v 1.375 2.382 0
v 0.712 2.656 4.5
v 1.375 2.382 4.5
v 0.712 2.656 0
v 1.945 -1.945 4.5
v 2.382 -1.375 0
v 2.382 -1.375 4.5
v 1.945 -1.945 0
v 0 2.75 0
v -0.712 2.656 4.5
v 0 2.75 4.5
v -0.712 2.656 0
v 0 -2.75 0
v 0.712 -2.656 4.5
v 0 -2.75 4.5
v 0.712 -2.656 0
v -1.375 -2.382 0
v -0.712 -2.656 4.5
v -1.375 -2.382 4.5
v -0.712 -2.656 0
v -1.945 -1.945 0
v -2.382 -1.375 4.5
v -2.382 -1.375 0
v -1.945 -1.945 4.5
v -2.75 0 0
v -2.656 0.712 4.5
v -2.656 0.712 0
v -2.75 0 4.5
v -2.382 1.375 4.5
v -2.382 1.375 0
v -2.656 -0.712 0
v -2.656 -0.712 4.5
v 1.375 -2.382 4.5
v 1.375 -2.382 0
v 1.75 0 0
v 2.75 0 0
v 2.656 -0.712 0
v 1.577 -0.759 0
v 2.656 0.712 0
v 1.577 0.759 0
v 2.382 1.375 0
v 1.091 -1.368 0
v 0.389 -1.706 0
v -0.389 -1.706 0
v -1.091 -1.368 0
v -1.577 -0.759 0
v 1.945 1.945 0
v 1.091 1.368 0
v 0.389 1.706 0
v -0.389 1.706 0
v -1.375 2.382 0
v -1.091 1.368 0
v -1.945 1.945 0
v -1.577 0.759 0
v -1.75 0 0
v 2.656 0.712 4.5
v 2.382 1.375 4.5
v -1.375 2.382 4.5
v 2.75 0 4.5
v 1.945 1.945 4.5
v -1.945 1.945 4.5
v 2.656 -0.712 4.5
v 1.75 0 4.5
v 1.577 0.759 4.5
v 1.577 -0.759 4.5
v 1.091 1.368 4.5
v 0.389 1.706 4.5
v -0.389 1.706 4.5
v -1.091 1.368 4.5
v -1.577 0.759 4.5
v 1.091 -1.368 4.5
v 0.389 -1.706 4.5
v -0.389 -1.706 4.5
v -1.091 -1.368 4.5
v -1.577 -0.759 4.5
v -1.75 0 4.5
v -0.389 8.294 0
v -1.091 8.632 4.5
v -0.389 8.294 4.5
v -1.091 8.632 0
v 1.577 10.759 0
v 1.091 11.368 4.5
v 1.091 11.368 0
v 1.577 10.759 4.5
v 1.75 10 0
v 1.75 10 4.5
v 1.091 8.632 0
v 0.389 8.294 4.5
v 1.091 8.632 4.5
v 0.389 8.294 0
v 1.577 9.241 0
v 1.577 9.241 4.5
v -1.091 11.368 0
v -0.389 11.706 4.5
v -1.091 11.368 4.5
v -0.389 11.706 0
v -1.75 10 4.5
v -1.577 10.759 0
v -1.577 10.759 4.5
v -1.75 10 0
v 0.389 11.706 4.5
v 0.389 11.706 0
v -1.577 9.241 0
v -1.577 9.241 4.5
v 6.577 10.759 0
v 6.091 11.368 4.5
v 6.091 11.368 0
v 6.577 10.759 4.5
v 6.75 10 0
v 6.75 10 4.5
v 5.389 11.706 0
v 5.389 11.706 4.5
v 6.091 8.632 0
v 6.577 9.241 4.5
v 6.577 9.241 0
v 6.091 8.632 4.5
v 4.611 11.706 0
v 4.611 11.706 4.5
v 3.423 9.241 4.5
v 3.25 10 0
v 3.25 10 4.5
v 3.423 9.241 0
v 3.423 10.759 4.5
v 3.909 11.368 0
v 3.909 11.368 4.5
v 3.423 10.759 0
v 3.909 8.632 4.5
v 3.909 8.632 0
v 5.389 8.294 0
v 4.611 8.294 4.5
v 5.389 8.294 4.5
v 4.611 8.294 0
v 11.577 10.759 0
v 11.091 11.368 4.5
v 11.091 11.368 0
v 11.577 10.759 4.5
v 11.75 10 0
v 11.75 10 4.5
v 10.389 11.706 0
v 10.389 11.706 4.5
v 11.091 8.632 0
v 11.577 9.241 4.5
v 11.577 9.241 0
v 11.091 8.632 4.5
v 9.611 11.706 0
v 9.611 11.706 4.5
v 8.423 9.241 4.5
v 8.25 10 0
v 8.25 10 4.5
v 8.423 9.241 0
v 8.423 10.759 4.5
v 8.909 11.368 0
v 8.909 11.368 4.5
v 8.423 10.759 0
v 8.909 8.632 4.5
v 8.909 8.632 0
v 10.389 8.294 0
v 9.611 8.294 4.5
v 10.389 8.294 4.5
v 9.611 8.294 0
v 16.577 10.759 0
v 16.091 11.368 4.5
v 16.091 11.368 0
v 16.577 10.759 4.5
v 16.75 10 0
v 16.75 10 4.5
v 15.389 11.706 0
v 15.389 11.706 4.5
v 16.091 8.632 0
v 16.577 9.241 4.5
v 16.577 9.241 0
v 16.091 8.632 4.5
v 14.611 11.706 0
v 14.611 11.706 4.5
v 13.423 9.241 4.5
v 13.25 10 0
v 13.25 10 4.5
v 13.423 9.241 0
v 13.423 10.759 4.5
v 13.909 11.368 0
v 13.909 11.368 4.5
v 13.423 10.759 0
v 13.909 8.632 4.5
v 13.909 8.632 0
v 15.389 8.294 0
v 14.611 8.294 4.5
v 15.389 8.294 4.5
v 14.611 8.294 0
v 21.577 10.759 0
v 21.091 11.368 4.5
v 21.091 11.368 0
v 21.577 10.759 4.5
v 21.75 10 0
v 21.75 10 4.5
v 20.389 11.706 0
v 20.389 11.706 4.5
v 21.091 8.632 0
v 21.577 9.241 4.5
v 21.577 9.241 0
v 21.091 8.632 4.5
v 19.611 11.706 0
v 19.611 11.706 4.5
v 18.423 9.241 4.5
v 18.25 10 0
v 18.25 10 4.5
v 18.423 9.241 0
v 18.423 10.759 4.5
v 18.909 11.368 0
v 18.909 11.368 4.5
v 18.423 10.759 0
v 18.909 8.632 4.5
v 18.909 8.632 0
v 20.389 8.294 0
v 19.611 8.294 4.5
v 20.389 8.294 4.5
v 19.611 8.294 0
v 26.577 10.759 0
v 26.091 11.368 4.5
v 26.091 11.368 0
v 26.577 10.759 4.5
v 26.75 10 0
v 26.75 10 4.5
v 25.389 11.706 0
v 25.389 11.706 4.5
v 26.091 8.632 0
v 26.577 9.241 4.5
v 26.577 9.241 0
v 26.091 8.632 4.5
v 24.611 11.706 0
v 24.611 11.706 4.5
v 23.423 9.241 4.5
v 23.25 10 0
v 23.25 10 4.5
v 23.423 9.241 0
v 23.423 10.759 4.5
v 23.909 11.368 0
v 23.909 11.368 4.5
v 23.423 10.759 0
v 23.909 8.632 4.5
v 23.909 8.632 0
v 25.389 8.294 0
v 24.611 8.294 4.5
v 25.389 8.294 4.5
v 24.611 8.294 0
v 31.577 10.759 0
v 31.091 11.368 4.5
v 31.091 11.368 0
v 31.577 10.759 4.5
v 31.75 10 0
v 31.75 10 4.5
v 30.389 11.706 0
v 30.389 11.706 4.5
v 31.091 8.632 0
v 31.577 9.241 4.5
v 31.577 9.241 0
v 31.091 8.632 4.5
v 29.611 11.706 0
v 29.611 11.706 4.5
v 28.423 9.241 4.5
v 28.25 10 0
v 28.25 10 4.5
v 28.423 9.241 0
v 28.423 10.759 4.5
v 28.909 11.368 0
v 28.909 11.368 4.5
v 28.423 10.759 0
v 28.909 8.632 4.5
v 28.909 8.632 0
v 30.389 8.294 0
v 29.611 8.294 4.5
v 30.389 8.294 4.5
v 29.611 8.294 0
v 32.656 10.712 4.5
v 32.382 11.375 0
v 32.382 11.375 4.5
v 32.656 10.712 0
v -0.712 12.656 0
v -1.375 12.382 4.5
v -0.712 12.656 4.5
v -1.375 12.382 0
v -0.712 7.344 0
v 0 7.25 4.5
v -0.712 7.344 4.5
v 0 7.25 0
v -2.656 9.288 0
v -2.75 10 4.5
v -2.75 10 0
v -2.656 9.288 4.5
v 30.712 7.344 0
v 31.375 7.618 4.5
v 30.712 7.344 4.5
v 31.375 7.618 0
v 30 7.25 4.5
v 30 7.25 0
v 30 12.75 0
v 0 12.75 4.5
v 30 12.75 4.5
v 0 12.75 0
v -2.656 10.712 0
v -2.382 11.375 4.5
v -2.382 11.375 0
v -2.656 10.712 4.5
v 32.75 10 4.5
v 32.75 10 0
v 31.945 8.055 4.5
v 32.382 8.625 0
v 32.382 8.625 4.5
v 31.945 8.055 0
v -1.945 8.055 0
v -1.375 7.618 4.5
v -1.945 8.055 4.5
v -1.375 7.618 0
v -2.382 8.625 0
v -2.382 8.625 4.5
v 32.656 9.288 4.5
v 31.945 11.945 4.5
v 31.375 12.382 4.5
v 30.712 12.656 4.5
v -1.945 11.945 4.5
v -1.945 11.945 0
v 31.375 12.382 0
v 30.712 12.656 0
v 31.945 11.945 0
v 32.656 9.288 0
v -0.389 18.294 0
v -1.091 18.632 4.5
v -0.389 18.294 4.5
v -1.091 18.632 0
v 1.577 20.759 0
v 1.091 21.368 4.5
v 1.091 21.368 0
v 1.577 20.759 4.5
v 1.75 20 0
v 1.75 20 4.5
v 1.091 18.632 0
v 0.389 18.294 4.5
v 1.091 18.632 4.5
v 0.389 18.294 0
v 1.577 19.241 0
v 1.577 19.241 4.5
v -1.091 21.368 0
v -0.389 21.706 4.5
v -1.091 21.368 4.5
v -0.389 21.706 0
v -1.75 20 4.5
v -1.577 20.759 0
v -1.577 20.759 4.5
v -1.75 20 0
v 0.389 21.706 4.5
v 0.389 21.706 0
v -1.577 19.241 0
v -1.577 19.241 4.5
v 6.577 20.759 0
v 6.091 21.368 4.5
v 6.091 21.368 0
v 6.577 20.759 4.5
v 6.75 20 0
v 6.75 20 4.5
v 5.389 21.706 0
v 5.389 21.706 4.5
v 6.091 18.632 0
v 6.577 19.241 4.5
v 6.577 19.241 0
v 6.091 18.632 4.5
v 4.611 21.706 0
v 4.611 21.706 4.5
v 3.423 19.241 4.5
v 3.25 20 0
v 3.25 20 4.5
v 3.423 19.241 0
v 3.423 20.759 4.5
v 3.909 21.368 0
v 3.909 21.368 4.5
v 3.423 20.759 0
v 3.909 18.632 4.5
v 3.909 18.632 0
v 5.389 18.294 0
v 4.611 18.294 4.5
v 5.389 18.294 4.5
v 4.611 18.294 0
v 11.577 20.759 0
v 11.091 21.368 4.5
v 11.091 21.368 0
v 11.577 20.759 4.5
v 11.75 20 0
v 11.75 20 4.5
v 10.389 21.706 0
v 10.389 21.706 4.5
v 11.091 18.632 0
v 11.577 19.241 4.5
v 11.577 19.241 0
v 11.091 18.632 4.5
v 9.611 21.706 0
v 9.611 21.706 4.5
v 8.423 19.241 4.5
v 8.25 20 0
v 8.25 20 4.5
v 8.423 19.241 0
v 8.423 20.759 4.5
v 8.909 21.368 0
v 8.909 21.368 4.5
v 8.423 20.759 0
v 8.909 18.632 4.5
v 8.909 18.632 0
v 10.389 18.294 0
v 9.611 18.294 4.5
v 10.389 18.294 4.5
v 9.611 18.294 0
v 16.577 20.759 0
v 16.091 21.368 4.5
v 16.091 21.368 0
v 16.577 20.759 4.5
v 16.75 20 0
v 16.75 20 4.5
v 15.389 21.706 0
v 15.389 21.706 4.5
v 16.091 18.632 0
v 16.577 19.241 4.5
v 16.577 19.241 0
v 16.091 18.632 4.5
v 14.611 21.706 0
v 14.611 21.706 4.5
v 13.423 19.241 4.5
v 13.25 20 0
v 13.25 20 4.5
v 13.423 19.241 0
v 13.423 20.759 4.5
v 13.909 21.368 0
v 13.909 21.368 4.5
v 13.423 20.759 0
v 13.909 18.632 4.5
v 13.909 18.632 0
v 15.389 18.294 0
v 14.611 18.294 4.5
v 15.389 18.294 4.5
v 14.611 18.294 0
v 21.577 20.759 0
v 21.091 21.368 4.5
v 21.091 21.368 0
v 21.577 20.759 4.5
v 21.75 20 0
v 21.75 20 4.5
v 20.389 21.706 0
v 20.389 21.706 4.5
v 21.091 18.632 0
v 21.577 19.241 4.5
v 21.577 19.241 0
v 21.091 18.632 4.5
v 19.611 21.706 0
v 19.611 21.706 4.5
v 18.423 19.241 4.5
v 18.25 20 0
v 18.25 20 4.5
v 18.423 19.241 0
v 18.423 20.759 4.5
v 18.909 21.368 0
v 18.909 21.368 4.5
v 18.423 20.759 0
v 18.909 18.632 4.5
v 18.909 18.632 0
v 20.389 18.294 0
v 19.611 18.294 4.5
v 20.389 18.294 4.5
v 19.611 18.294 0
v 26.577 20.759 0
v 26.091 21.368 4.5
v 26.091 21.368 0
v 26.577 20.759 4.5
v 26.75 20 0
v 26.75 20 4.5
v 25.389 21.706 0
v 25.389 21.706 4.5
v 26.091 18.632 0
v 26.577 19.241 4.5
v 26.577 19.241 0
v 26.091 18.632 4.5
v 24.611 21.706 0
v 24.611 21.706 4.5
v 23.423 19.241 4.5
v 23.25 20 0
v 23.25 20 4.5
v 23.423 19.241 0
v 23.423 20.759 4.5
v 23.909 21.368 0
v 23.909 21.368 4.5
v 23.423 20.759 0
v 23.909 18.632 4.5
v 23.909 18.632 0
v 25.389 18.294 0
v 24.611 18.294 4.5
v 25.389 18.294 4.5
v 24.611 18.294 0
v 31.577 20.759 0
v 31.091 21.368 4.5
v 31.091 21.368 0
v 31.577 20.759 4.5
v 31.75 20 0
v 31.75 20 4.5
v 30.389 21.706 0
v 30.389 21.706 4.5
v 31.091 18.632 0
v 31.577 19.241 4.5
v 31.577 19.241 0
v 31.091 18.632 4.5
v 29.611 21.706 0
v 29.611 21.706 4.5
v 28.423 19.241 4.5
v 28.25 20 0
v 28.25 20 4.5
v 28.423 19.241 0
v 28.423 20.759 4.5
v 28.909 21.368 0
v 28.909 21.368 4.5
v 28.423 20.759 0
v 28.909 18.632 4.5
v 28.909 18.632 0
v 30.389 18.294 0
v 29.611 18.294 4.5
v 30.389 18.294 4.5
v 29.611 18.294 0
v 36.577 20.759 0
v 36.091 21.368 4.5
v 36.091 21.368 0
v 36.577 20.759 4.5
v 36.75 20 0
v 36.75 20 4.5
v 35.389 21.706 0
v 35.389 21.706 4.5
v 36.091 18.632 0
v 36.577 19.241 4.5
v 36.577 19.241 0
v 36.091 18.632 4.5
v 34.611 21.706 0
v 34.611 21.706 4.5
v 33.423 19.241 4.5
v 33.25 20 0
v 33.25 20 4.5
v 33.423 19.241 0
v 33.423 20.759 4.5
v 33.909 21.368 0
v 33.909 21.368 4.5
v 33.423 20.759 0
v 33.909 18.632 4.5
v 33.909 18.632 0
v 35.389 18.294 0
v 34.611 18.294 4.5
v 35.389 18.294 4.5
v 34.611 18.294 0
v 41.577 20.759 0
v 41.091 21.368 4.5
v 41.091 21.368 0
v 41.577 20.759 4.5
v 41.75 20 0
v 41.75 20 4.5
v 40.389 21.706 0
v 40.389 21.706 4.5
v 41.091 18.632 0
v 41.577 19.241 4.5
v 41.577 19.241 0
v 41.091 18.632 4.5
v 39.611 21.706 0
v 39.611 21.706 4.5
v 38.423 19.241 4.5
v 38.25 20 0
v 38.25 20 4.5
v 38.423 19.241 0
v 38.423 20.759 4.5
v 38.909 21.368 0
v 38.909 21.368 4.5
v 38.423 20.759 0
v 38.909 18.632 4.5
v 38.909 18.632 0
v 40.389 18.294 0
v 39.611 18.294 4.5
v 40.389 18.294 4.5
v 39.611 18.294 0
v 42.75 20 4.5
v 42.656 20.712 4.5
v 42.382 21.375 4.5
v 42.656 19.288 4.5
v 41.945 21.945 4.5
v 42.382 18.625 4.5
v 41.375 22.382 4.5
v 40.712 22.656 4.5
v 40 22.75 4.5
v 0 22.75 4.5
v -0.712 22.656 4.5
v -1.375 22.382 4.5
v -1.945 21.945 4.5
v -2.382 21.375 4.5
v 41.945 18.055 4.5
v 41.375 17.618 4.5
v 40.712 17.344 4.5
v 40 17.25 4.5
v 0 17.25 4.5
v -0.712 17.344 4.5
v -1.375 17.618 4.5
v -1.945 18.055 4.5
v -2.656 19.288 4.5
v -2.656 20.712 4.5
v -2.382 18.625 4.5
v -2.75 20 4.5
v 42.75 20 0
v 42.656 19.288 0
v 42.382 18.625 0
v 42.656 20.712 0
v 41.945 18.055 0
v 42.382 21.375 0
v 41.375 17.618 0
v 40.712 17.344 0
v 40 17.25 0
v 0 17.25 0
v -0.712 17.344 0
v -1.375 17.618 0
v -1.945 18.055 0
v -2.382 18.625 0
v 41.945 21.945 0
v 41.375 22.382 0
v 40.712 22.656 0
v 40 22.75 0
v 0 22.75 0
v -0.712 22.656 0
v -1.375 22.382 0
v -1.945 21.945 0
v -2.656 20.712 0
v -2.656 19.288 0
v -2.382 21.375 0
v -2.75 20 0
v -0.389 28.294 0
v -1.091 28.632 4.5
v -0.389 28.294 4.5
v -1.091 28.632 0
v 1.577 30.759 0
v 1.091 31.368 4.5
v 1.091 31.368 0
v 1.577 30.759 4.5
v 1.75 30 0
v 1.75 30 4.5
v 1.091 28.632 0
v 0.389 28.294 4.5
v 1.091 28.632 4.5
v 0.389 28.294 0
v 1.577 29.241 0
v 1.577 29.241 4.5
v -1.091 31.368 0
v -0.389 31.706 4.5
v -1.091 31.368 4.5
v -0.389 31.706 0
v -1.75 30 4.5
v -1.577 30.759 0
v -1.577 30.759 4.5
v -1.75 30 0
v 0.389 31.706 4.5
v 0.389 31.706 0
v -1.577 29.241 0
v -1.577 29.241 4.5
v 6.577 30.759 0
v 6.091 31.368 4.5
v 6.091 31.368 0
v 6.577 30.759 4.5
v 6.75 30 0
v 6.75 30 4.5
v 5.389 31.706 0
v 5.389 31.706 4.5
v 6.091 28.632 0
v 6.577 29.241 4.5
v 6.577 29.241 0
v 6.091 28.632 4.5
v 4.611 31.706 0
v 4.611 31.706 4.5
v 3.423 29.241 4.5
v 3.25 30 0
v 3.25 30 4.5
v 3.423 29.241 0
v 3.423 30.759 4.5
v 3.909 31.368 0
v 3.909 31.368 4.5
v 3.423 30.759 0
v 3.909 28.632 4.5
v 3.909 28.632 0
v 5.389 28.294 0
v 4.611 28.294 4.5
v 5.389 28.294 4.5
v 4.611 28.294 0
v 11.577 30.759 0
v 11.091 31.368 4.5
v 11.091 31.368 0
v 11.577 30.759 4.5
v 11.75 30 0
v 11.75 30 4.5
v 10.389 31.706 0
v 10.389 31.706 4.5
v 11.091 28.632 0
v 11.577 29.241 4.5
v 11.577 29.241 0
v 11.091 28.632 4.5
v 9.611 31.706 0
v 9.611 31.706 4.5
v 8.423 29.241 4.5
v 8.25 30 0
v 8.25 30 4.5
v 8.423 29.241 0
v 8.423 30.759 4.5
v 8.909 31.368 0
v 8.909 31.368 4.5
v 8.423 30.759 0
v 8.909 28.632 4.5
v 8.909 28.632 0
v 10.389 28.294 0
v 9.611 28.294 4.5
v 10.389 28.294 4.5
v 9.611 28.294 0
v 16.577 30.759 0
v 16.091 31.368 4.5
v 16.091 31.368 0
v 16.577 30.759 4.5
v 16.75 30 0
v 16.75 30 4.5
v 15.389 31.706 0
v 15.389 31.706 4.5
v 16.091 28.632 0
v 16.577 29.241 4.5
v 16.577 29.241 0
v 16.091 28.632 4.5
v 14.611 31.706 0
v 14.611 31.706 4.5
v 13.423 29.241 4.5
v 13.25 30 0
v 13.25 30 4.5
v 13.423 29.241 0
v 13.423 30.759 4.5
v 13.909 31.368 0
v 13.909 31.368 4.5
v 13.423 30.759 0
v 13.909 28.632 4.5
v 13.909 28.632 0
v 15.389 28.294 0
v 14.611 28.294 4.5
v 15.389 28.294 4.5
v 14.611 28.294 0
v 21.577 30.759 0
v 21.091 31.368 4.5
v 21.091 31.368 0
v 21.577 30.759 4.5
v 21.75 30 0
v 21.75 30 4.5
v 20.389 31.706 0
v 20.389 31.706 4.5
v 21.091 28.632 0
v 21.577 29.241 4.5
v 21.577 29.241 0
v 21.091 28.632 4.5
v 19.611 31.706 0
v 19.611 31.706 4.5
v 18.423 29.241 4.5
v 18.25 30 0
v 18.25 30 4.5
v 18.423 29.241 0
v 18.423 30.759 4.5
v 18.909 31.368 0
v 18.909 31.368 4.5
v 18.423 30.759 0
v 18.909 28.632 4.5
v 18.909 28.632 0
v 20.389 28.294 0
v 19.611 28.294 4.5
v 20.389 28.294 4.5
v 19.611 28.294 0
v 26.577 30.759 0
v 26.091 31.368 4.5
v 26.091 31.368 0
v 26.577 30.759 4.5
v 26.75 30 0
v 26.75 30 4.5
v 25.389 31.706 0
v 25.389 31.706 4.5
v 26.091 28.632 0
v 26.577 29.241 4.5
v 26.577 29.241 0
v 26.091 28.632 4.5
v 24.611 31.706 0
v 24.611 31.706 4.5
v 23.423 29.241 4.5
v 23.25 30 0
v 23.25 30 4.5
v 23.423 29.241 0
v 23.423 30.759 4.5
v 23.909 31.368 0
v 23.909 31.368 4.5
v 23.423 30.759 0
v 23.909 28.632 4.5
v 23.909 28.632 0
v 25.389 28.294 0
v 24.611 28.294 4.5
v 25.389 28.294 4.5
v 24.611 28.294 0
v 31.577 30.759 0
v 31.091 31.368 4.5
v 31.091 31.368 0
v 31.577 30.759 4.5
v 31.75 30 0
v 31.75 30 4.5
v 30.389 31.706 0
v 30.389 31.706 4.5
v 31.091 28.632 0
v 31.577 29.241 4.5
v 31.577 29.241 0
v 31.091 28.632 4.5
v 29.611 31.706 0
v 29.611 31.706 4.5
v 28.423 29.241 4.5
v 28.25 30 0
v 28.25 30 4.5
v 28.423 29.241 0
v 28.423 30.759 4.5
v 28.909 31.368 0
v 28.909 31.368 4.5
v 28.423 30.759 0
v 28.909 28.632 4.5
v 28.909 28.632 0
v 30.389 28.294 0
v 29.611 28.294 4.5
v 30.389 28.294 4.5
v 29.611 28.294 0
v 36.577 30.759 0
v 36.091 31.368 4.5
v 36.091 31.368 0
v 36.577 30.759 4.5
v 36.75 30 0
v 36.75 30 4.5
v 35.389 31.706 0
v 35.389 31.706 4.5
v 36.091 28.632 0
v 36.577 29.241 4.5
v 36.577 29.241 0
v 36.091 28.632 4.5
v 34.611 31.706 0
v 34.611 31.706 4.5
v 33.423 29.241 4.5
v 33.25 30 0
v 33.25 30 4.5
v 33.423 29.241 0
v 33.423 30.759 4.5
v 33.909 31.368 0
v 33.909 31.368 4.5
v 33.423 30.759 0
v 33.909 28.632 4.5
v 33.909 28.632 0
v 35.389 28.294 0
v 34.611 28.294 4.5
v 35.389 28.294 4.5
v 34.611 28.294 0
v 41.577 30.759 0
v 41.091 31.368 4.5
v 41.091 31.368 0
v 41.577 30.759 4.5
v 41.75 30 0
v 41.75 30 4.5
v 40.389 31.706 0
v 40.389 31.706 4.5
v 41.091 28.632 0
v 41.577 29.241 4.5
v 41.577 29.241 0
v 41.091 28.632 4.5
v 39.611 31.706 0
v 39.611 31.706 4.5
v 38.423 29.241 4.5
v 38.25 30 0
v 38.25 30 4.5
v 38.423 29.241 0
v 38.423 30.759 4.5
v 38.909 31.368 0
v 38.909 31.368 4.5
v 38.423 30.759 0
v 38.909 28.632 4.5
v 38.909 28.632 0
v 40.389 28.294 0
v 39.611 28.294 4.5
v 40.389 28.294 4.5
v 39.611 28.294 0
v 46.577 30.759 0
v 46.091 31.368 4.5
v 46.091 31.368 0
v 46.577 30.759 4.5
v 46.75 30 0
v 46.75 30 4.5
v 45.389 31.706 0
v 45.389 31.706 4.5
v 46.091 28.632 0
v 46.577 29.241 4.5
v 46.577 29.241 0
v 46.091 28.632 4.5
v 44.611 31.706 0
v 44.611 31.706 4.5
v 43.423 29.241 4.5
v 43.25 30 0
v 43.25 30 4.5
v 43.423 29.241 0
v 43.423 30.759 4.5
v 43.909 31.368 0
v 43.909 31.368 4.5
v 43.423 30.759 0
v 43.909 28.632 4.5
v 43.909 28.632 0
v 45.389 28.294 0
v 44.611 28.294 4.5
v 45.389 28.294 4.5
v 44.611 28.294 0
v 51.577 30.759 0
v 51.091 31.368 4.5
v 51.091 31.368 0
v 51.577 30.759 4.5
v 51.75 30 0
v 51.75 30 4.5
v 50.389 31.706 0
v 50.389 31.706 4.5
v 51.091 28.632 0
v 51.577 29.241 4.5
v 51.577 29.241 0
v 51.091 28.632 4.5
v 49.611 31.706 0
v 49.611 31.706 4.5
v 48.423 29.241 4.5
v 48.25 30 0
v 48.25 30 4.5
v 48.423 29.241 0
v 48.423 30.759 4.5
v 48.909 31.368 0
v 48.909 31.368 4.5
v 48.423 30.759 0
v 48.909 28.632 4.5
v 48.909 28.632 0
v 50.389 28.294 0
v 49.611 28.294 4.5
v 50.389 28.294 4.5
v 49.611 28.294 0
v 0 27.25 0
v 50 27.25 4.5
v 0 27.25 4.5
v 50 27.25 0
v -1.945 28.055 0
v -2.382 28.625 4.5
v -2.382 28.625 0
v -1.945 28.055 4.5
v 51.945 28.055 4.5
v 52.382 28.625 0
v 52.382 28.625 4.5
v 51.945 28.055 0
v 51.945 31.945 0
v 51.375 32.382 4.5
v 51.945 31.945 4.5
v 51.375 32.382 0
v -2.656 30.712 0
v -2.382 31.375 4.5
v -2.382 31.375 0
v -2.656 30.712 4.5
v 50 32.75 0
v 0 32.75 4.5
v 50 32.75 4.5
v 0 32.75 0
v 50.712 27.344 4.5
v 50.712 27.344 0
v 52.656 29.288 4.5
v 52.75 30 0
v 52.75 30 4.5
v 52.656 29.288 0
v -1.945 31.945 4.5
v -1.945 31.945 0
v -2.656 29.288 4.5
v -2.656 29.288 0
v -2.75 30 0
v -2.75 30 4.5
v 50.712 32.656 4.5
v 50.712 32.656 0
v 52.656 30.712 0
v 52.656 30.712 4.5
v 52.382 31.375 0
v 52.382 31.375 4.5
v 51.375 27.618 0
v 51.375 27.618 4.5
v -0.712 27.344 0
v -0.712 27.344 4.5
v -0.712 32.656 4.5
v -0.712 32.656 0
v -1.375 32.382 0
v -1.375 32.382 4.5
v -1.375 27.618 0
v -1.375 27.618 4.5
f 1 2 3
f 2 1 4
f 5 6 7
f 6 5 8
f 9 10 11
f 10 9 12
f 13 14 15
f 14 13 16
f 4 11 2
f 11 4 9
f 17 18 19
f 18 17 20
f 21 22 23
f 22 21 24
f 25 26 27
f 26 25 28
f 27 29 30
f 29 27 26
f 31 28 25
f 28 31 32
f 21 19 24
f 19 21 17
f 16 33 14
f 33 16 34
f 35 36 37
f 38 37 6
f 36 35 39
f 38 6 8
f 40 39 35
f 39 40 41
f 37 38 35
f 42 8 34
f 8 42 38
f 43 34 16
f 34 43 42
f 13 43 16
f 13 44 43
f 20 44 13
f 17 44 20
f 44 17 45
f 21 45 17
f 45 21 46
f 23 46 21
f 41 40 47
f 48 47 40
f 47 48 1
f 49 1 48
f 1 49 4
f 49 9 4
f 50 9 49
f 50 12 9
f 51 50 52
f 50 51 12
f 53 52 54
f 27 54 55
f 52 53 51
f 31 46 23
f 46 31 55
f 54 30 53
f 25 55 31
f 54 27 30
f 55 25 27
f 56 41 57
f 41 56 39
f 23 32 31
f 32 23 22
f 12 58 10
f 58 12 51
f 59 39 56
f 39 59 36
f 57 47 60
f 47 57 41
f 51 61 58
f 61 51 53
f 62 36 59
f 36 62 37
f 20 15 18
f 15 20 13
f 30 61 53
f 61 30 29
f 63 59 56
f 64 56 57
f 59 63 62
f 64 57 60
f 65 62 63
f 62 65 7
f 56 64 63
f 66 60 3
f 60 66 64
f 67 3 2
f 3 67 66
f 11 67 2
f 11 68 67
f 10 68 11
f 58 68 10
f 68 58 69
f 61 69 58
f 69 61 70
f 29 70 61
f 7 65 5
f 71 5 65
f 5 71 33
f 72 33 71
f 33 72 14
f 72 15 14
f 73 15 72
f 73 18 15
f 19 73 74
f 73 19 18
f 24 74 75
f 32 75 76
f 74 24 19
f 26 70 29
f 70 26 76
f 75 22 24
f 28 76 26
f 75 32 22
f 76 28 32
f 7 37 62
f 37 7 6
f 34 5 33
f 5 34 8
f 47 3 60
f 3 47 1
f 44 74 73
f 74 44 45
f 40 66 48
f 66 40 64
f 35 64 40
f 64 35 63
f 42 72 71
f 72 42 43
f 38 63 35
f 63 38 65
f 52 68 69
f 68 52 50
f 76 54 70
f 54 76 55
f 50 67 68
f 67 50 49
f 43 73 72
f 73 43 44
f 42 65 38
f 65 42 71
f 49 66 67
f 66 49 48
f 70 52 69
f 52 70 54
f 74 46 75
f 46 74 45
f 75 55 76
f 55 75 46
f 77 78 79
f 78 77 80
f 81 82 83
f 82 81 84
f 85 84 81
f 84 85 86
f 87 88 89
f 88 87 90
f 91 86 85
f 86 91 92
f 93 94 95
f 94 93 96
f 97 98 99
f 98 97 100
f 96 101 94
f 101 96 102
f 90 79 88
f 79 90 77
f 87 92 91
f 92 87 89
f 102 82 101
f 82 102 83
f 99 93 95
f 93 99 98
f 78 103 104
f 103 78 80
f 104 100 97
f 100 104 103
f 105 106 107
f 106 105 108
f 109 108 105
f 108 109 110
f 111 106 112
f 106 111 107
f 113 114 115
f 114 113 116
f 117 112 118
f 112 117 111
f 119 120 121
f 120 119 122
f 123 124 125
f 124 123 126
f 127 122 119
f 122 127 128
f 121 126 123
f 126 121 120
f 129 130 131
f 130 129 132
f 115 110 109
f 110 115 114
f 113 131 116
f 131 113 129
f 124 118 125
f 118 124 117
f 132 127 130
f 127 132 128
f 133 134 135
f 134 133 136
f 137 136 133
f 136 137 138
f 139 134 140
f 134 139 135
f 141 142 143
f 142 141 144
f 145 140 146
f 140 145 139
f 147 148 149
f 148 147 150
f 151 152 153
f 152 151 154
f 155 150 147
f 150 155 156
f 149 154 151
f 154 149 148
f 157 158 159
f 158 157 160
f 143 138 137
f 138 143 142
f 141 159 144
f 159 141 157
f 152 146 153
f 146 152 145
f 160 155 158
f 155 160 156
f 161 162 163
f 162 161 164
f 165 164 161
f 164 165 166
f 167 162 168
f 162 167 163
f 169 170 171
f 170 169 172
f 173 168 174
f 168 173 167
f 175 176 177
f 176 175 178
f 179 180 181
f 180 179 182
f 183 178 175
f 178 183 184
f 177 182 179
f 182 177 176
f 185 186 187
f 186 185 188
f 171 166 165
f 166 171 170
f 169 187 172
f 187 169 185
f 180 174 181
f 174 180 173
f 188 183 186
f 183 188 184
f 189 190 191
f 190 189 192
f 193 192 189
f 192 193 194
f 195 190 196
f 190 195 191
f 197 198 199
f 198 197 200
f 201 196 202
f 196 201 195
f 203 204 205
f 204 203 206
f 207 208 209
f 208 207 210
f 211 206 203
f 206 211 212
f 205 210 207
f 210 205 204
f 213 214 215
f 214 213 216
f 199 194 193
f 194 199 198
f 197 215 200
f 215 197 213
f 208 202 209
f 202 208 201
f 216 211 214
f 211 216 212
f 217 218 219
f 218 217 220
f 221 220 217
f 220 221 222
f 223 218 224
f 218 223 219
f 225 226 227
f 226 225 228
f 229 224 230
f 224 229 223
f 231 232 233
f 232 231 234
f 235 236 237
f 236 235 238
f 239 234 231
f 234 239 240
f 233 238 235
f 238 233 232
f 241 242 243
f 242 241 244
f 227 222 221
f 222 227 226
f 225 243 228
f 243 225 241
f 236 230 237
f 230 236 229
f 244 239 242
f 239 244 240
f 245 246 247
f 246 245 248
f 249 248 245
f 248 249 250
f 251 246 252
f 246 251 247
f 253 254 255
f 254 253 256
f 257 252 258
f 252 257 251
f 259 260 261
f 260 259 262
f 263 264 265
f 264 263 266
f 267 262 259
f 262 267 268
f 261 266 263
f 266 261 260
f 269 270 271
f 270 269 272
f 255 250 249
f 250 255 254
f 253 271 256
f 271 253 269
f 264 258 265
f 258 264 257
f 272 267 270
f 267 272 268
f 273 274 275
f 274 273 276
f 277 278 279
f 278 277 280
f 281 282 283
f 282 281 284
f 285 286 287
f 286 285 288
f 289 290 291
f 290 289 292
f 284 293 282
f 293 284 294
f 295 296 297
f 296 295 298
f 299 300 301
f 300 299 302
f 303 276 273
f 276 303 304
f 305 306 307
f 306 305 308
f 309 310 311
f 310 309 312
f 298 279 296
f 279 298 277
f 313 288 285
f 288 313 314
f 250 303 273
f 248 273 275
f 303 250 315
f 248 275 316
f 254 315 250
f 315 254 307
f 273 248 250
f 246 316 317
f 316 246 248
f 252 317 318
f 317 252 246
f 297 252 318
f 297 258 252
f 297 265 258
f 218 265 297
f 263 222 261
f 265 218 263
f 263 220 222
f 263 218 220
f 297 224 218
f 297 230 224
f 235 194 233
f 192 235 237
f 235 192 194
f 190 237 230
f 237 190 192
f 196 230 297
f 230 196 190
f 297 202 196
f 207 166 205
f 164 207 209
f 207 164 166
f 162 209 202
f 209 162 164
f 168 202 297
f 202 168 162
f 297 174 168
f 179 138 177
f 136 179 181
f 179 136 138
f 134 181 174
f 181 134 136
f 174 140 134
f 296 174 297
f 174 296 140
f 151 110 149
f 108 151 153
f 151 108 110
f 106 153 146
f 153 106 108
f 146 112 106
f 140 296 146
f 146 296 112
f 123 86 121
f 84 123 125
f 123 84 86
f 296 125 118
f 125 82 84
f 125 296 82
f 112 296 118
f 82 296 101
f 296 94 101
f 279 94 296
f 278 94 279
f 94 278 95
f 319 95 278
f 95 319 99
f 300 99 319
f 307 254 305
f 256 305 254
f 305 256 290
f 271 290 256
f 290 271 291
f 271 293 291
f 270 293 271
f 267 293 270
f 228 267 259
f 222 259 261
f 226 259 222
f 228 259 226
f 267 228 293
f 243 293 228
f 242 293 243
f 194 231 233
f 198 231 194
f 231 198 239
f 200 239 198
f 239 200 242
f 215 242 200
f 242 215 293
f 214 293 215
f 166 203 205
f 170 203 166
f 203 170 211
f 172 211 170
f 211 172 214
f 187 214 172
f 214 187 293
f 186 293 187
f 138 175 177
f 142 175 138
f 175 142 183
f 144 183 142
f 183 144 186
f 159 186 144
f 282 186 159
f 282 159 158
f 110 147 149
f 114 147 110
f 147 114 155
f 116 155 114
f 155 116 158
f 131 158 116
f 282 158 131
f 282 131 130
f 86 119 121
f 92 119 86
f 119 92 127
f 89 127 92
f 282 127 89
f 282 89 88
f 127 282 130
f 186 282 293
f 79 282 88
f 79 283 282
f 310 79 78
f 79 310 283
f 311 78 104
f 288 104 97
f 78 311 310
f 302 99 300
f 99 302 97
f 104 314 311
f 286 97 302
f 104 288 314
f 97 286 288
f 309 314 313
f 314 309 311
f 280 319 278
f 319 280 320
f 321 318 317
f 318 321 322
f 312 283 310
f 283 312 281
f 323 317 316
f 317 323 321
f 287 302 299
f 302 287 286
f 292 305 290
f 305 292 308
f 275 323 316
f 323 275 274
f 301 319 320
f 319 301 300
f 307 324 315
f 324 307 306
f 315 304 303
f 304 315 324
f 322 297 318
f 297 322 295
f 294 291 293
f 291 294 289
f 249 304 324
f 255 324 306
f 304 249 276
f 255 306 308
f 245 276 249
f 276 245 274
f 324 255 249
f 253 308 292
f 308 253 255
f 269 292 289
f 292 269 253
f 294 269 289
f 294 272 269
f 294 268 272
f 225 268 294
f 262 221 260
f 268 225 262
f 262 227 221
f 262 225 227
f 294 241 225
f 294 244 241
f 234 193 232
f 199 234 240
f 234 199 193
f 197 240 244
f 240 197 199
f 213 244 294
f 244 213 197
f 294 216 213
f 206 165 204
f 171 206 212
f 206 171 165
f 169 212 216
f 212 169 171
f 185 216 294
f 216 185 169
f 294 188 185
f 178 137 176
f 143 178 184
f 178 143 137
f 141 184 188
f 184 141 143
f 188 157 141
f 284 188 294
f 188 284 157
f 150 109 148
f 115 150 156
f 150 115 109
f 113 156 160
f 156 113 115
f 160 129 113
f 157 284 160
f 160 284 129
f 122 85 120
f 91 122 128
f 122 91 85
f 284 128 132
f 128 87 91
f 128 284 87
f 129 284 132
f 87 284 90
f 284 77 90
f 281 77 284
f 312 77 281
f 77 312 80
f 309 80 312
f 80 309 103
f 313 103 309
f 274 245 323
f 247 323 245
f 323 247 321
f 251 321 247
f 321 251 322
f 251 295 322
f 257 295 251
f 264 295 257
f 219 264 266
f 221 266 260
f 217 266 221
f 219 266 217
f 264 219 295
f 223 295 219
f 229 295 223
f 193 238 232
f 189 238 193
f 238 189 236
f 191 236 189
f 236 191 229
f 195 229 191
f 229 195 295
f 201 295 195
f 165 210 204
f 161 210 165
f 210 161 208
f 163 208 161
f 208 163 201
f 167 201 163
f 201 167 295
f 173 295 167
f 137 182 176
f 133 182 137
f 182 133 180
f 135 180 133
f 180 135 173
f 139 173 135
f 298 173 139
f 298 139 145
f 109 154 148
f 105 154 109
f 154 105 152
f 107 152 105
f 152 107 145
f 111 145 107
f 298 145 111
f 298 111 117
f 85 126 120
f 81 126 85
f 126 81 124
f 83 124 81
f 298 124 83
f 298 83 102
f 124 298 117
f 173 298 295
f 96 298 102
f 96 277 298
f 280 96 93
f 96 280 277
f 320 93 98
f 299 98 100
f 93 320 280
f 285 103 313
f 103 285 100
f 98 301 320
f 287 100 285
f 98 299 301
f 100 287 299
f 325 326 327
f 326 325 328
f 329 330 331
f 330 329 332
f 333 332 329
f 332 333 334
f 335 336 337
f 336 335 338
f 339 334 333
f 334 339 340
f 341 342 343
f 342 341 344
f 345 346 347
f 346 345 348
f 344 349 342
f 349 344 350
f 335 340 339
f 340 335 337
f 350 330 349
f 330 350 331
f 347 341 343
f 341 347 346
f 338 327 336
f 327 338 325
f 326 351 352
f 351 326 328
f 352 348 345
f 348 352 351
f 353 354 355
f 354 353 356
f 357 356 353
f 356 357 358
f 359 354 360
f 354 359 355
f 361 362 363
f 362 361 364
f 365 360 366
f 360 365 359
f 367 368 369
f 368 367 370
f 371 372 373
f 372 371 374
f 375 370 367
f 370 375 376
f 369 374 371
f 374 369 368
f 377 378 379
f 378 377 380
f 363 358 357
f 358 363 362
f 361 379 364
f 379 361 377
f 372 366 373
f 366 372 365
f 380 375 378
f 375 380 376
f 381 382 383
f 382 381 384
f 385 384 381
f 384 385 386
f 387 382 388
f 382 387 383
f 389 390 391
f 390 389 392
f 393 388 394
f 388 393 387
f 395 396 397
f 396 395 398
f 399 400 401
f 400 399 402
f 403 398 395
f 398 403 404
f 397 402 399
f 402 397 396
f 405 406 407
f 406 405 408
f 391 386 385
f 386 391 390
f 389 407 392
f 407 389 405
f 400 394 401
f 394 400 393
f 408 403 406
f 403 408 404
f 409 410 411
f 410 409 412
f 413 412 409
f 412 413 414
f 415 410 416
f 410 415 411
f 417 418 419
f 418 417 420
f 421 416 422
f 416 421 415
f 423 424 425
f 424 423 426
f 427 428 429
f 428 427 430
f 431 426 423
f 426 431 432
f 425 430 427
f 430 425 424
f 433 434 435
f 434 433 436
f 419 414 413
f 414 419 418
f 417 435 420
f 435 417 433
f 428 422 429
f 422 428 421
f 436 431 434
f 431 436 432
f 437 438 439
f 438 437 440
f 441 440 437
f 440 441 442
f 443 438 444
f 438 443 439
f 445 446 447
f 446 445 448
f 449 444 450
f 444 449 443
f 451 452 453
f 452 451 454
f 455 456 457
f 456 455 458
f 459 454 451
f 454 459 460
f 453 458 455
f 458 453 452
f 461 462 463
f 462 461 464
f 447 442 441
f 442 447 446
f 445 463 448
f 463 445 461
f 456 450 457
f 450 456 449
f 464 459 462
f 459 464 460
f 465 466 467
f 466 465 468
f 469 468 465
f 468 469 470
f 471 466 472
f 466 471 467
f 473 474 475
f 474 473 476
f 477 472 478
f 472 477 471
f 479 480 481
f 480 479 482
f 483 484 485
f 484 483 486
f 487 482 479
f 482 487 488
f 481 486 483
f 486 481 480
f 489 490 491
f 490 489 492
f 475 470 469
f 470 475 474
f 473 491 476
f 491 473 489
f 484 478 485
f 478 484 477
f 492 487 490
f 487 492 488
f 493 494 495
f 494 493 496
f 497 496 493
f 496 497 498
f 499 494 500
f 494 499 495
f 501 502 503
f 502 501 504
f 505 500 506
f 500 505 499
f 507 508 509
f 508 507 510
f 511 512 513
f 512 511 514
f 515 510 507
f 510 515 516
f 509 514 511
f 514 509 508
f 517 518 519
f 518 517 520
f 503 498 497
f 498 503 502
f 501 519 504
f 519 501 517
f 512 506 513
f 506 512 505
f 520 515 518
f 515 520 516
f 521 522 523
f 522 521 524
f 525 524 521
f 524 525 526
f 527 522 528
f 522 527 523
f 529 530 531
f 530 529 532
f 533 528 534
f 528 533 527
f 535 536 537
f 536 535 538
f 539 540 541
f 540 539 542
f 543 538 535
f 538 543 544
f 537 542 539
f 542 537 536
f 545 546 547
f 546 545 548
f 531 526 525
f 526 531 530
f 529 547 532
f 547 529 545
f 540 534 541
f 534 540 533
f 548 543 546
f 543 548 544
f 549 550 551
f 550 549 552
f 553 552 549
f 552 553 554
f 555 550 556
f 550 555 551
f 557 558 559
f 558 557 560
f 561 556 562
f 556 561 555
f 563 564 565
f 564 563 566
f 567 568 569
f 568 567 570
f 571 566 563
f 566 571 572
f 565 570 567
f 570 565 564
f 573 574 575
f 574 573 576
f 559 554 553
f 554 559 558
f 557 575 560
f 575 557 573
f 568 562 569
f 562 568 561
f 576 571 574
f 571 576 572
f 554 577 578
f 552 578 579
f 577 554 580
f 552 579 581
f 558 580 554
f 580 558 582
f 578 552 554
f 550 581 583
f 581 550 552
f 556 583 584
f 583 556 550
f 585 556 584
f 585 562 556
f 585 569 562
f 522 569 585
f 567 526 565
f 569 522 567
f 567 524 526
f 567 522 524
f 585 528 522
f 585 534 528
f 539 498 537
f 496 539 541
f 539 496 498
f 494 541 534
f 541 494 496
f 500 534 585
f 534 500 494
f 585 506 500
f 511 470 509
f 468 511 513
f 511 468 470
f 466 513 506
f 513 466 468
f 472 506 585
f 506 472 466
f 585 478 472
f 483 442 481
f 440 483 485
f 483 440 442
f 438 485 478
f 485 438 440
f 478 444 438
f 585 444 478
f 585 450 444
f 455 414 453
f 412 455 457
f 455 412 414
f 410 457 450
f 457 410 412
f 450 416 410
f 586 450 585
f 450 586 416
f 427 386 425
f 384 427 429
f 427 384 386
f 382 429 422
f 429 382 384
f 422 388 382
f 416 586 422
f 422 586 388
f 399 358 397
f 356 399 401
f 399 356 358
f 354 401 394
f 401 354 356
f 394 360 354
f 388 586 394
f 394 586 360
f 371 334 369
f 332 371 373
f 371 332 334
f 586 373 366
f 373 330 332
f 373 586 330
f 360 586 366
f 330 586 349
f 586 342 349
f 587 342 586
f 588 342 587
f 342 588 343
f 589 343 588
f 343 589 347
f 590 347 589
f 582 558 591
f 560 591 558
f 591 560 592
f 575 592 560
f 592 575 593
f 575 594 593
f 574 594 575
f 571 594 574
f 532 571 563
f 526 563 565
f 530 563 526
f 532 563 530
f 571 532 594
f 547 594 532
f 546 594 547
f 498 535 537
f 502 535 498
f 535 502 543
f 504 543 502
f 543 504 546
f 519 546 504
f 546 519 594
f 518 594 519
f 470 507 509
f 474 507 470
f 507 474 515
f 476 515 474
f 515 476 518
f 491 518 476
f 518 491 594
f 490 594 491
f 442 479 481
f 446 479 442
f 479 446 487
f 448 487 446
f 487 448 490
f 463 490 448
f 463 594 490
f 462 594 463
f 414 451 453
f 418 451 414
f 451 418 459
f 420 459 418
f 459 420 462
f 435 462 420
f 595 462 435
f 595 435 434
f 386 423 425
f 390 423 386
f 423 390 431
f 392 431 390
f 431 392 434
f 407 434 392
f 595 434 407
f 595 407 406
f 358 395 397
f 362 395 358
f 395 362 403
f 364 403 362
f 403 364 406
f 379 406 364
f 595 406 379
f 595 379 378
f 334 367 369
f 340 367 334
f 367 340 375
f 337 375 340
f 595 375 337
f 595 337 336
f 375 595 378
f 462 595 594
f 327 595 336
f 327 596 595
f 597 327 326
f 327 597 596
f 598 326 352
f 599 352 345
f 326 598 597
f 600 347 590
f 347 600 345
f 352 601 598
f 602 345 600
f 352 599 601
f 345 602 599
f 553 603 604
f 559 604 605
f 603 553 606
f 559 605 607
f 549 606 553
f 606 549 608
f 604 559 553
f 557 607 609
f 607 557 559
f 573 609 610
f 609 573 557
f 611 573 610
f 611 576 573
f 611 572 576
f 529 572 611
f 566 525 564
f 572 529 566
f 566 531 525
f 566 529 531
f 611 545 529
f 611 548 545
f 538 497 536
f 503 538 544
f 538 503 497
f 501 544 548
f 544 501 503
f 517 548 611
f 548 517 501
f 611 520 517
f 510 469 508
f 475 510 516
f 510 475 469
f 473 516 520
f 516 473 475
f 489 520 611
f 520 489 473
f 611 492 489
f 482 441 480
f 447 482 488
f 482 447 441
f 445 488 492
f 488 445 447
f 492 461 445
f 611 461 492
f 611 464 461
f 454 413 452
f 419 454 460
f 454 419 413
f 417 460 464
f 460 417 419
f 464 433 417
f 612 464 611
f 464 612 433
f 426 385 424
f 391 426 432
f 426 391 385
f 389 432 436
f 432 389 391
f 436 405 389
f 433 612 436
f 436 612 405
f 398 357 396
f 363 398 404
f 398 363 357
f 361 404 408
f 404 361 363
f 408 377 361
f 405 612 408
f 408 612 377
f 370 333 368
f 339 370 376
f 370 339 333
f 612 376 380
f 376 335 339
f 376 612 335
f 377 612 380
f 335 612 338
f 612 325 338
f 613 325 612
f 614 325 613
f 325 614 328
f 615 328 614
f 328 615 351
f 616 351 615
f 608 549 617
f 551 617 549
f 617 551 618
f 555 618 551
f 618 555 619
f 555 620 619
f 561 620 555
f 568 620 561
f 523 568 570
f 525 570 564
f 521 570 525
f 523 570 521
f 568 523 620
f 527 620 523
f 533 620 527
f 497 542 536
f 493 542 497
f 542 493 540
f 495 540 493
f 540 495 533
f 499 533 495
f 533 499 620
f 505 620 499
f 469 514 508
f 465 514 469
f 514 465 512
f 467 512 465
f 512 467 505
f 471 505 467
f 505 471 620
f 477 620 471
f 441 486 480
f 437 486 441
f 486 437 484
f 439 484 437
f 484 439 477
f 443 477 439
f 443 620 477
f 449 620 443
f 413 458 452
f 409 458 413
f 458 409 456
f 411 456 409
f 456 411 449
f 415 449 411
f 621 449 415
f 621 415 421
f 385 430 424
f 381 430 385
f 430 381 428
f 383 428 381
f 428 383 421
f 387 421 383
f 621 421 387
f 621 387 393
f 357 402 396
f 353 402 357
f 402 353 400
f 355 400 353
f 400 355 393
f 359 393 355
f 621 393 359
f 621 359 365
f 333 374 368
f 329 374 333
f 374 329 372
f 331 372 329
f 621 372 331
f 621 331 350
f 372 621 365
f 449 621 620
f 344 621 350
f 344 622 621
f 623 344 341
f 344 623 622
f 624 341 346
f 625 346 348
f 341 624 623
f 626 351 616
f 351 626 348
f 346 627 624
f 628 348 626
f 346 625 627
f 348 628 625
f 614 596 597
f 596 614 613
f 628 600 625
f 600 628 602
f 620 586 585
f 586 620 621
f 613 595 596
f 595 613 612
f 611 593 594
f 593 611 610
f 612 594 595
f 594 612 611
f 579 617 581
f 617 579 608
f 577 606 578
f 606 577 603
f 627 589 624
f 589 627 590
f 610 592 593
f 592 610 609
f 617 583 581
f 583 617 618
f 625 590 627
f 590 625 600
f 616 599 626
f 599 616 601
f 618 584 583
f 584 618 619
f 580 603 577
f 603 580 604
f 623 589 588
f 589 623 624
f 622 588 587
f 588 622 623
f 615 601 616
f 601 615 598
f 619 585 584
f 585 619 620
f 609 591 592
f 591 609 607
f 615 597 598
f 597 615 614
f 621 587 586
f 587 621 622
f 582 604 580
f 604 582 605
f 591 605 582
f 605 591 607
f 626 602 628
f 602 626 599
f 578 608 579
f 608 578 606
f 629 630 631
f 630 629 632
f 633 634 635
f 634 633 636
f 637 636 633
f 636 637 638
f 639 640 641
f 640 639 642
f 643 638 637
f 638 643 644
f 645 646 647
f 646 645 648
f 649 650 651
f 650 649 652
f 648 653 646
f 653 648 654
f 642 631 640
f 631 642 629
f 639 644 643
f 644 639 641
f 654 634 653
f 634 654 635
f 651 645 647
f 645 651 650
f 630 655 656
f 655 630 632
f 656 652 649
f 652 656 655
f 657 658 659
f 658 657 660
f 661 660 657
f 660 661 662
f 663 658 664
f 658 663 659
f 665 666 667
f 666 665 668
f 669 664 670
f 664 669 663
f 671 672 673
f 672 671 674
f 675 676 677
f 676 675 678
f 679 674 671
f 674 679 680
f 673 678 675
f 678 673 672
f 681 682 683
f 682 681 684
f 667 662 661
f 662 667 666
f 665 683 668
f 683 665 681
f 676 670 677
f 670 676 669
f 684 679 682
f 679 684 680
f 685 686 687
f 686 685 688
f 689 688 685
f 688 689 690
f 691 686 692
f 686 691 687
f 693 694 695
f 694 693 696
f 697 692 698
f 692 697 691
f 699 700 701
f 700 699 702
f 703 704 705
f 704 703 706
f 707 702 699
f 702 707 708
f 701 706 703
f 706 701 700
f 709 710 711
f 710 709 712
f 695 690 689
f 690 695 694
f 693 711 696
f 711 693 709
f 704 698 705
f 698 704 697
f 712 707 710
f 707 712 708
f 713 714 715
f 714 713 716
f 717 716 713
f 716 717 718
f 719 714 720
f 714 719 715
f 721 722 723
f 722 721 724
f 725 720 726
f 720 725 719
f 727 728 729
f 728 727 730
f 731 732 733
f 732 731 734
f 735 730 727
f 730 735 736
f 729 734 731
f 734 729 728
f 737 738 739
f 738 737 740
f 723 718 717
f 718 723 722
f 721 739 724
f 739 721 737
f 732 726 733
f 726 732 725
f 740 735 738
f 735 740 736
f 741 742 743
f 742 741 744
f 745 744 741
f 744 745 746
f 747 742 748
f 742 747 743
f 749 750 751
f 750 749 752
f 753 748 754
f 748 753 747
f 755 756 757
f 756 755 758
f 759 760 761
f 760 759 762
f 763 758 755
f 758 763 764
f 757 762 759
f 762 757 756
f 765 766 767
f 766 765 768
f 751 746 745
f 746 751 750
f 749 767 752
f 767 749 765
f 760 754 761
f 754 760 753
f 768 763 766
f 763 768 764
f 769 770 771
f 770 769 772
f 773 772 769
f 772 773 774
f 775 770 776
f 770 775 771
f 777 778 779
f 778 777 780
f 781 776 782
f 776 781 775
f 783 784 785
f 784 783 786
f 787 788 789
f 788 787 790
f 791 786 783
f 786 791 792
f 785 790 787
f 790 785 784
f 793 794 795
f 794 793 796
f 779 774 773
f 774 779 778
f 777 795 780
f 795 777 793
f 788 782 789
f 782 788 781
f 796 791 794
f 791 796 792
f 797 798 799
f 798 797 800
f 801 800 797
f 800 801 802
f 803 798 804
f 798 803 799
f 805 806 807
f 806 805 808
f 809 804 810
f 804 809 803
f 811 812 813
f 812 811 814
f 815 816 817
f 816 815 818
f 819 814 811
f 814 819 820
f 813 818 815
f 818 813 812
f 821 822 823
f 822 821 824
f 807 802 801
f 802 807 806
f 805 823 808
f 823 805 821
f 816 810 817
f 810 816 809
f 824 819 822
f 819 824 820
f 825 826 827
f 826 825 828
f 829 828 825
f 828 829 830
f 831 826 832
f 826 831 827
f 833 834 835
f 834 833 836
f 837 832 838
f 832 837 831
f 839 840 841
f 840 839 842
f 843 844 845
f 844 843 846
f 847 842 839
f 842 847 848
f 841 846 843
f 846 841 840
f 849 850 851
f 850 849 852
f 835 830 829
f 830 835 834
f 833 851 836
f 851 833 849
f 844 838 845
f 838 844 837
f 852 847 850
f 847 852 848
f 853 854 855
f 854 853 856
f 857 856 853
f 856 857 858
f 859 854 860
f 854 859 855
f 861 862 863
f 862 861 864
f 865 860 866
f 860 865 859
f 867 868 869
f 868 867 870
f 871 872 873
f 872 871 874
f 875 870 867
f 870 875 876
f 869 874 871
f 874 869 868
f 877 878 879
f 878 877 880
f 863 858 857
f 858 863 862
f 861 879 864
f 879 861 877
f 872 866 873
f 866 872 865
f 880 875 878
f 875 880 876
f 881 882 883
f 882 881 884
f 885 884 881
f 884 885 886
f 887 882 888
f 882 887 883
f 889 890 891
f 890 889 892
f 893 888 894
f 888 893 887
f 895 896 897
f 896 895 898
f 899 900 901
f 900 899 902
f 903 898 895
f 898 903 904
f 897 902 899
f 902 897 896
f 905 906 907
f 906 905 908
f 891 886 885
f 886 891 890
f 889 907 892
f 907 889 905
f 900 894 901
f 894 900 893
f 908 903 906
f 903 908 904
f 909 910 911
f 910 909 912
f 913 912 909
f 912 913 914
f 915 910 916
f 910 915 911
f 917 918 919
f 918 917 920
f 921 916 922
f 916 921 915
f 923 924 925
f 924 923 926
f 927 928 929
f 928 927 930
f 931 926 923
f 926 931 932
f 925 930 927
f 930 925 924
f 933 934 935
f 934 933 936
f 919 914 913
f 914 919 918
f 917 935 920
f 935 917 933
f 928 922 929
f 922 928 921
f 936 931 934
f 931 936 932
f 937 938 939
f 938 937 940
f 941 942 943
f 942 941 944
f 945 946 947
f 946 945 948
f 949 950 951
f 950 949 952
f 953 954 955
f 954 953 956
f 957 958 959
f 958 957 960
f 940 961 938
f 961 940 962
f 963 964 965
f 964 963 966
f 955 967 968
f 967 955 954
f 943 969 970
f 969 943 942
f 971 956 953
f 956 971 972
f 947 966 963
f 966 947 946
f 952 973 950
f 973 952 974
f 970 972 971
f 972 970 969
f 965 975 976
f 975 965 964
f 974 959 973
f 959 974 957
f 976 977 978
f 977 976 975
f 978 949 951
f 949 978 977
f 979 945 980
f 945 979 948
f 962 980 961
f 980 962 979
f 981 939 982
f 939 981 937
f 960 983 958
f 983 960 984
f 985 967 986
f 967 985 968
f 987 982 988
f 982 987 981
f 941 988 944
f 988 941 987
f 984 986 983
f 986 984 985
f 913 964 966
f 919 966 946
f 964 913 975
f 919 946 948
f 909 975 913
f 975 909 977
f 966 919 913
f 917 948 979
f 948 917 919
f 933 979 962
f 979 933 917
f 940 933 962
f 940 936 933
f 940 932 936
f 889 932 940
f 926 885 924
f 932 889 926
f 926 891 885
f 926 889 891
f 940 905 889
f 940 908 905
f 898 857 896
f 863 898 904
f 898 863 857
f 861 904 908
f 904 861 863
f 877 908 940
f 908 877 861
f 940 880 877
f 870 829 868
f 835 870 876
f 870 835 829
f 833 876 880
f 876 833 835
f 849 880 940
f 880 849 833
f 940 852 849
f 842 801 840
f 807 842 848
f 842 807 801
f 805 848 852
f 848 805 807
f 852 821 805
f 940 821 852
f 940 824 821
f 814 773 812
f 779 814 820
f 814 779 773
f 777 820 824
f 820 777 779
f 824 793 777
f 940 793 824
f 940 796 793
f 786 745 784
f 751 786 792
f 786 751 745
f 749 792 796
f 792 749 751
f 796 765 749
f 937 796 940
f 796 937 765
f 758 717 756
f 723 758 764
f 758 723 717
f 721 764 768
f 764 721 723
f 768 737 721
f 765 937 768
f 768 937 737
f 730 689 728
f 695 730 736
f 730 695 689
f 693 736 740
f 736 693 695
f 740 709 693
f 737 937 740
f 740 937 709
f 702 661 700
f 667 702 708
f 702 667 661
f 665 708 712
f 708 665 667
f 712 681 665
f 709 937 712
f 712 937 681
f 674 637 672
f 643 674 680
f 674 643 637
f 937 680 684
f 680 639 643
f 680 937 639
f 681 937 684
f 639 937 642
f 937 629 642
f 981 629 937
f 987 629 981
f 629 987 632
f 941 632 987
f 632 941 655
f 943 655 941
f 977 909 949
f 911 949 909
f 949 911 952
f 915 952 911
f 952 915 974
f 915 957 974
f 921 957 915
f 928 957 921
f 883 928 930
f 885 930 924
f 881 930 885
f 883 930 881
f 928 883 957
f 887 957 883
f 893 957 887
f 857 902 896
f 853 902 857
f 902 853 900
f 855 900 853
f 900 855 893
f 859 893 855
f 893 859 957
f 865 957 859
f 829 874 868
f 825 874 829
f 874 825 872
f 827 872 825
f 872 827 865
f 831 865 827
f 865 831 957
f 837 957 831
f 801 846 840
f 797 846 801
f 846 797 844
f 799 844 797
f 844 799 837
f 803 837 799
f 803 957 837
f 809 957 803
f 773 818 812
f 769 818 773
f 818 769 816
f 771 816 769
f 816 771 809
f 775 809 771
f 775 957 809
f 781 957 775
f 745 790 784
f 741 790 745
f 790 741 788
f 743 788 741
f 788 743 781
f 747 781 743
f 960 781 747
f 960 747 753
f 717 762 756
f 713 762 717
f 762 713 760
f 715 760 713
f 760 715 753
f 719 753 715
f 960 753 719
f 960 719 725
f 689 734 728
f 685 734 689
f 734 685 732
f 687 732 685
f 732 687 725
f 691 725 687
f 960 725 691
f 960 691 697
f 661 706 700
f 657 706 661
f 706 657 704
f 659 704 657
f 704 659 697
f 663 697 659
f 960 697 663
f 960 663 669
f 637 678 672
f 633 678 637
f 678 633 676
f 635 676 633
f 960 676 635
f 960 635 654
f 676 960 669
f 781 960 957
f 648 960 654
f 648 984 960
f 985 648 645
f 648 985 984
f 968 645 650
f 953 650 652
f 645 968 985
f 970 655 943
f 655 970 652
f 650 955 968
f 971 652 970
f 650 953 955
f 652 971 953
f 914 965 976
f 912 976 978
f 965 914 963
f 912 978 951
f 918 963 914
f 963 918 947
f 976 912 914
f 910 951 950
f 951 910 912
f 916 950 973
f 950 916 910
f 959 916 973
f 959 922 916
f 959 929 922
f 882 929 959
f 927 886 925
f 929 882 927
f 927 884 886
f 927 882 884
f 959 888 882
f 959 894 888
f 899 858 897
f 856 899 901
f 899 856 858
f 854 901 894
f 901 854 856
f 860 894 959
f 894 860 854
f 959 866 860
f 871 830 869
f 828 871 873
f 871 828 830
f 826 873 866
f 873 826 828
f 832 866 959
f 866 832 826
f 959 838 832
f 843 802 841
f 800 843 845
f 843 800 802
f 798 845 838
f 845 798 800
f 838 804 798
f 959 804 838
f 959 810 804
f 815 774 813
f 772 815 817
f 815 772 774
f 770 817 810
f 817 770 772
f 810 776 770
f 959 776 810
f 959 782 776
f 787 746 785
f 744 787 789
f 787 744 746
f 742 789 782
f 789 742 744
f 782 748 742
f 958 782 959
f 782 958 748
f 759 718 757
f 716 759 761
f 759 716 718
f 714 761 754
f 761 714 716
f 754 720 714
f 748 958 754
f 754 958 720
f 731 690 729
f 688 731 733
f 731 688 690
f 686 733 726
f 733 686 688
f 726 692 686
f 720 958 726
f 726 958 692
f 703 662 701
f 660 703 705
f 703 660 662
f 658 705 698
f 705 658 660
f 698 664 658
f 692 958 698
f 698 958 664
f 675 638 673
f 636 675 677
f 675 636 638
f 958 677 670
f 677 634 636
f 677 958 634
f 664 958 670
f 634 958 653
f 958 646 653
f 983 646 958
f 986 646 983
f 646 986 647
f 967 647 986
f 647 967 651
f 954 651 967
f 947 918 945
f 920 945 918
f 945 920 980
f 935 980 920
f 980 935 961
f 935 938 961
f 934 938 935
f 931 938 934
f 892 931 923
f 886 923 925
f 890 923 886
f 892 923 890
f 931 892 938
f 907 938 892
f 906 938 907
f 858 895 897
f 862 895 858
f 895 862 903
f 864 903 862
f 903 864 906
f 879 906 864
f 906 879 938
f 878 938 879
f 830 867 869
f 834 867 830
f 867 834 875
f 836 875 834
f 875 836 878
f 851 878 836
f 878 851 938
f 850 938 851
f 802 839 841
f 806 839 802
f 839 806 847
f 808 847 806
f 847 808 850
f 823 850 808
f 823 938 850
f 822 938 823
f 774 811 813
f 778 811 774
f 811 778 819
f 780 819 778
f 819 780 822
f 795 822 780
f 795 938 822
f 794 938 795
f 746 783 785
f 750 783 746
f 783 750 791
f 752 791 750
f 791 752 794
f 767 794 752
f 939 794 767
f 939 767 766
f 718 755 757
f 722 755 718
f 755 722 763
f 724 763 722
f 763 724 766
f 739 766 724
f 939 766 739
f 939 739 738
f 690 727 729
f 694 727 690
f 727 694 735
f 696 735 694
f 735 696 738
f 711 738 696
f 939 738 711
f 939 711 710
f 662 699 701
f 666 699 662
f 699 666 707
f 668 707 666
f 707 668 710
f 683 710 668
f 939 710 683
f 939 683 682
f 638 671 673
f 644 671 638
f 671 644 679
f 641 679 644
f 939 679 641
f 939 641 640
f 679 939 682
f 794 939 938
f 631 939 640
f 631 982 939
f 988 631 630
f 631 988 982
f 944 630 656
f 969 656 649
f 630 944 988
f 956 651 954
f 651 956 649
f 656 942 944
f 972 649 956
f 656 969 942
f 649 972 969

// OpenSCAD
h = 4.5;  //height
d = 3.5;  //hole diameter
wall = 1; //wall thickness
m = 5;

r = d/2;
res = 4; //resolution

module part(holes = 1) {
  difference() {
    hull() {
      for(i = [0, holes-1])
        translate([i*m,0,0])
          cylinder(r = r+wall, h = h, $fn = round(r+wall)*2*res);
    }

    for(i = [0:holes-1])
      translate(v = [i*m,0,-1])
        cylinder(r = r, h = h+2, $fn = r*2*res);
  }
}

part(1);

translate(v = [0,10,0])
  part(7);

translate(v = [0,20,0])
  part(9);

translate(v = [0,30,0])
  part(11);
